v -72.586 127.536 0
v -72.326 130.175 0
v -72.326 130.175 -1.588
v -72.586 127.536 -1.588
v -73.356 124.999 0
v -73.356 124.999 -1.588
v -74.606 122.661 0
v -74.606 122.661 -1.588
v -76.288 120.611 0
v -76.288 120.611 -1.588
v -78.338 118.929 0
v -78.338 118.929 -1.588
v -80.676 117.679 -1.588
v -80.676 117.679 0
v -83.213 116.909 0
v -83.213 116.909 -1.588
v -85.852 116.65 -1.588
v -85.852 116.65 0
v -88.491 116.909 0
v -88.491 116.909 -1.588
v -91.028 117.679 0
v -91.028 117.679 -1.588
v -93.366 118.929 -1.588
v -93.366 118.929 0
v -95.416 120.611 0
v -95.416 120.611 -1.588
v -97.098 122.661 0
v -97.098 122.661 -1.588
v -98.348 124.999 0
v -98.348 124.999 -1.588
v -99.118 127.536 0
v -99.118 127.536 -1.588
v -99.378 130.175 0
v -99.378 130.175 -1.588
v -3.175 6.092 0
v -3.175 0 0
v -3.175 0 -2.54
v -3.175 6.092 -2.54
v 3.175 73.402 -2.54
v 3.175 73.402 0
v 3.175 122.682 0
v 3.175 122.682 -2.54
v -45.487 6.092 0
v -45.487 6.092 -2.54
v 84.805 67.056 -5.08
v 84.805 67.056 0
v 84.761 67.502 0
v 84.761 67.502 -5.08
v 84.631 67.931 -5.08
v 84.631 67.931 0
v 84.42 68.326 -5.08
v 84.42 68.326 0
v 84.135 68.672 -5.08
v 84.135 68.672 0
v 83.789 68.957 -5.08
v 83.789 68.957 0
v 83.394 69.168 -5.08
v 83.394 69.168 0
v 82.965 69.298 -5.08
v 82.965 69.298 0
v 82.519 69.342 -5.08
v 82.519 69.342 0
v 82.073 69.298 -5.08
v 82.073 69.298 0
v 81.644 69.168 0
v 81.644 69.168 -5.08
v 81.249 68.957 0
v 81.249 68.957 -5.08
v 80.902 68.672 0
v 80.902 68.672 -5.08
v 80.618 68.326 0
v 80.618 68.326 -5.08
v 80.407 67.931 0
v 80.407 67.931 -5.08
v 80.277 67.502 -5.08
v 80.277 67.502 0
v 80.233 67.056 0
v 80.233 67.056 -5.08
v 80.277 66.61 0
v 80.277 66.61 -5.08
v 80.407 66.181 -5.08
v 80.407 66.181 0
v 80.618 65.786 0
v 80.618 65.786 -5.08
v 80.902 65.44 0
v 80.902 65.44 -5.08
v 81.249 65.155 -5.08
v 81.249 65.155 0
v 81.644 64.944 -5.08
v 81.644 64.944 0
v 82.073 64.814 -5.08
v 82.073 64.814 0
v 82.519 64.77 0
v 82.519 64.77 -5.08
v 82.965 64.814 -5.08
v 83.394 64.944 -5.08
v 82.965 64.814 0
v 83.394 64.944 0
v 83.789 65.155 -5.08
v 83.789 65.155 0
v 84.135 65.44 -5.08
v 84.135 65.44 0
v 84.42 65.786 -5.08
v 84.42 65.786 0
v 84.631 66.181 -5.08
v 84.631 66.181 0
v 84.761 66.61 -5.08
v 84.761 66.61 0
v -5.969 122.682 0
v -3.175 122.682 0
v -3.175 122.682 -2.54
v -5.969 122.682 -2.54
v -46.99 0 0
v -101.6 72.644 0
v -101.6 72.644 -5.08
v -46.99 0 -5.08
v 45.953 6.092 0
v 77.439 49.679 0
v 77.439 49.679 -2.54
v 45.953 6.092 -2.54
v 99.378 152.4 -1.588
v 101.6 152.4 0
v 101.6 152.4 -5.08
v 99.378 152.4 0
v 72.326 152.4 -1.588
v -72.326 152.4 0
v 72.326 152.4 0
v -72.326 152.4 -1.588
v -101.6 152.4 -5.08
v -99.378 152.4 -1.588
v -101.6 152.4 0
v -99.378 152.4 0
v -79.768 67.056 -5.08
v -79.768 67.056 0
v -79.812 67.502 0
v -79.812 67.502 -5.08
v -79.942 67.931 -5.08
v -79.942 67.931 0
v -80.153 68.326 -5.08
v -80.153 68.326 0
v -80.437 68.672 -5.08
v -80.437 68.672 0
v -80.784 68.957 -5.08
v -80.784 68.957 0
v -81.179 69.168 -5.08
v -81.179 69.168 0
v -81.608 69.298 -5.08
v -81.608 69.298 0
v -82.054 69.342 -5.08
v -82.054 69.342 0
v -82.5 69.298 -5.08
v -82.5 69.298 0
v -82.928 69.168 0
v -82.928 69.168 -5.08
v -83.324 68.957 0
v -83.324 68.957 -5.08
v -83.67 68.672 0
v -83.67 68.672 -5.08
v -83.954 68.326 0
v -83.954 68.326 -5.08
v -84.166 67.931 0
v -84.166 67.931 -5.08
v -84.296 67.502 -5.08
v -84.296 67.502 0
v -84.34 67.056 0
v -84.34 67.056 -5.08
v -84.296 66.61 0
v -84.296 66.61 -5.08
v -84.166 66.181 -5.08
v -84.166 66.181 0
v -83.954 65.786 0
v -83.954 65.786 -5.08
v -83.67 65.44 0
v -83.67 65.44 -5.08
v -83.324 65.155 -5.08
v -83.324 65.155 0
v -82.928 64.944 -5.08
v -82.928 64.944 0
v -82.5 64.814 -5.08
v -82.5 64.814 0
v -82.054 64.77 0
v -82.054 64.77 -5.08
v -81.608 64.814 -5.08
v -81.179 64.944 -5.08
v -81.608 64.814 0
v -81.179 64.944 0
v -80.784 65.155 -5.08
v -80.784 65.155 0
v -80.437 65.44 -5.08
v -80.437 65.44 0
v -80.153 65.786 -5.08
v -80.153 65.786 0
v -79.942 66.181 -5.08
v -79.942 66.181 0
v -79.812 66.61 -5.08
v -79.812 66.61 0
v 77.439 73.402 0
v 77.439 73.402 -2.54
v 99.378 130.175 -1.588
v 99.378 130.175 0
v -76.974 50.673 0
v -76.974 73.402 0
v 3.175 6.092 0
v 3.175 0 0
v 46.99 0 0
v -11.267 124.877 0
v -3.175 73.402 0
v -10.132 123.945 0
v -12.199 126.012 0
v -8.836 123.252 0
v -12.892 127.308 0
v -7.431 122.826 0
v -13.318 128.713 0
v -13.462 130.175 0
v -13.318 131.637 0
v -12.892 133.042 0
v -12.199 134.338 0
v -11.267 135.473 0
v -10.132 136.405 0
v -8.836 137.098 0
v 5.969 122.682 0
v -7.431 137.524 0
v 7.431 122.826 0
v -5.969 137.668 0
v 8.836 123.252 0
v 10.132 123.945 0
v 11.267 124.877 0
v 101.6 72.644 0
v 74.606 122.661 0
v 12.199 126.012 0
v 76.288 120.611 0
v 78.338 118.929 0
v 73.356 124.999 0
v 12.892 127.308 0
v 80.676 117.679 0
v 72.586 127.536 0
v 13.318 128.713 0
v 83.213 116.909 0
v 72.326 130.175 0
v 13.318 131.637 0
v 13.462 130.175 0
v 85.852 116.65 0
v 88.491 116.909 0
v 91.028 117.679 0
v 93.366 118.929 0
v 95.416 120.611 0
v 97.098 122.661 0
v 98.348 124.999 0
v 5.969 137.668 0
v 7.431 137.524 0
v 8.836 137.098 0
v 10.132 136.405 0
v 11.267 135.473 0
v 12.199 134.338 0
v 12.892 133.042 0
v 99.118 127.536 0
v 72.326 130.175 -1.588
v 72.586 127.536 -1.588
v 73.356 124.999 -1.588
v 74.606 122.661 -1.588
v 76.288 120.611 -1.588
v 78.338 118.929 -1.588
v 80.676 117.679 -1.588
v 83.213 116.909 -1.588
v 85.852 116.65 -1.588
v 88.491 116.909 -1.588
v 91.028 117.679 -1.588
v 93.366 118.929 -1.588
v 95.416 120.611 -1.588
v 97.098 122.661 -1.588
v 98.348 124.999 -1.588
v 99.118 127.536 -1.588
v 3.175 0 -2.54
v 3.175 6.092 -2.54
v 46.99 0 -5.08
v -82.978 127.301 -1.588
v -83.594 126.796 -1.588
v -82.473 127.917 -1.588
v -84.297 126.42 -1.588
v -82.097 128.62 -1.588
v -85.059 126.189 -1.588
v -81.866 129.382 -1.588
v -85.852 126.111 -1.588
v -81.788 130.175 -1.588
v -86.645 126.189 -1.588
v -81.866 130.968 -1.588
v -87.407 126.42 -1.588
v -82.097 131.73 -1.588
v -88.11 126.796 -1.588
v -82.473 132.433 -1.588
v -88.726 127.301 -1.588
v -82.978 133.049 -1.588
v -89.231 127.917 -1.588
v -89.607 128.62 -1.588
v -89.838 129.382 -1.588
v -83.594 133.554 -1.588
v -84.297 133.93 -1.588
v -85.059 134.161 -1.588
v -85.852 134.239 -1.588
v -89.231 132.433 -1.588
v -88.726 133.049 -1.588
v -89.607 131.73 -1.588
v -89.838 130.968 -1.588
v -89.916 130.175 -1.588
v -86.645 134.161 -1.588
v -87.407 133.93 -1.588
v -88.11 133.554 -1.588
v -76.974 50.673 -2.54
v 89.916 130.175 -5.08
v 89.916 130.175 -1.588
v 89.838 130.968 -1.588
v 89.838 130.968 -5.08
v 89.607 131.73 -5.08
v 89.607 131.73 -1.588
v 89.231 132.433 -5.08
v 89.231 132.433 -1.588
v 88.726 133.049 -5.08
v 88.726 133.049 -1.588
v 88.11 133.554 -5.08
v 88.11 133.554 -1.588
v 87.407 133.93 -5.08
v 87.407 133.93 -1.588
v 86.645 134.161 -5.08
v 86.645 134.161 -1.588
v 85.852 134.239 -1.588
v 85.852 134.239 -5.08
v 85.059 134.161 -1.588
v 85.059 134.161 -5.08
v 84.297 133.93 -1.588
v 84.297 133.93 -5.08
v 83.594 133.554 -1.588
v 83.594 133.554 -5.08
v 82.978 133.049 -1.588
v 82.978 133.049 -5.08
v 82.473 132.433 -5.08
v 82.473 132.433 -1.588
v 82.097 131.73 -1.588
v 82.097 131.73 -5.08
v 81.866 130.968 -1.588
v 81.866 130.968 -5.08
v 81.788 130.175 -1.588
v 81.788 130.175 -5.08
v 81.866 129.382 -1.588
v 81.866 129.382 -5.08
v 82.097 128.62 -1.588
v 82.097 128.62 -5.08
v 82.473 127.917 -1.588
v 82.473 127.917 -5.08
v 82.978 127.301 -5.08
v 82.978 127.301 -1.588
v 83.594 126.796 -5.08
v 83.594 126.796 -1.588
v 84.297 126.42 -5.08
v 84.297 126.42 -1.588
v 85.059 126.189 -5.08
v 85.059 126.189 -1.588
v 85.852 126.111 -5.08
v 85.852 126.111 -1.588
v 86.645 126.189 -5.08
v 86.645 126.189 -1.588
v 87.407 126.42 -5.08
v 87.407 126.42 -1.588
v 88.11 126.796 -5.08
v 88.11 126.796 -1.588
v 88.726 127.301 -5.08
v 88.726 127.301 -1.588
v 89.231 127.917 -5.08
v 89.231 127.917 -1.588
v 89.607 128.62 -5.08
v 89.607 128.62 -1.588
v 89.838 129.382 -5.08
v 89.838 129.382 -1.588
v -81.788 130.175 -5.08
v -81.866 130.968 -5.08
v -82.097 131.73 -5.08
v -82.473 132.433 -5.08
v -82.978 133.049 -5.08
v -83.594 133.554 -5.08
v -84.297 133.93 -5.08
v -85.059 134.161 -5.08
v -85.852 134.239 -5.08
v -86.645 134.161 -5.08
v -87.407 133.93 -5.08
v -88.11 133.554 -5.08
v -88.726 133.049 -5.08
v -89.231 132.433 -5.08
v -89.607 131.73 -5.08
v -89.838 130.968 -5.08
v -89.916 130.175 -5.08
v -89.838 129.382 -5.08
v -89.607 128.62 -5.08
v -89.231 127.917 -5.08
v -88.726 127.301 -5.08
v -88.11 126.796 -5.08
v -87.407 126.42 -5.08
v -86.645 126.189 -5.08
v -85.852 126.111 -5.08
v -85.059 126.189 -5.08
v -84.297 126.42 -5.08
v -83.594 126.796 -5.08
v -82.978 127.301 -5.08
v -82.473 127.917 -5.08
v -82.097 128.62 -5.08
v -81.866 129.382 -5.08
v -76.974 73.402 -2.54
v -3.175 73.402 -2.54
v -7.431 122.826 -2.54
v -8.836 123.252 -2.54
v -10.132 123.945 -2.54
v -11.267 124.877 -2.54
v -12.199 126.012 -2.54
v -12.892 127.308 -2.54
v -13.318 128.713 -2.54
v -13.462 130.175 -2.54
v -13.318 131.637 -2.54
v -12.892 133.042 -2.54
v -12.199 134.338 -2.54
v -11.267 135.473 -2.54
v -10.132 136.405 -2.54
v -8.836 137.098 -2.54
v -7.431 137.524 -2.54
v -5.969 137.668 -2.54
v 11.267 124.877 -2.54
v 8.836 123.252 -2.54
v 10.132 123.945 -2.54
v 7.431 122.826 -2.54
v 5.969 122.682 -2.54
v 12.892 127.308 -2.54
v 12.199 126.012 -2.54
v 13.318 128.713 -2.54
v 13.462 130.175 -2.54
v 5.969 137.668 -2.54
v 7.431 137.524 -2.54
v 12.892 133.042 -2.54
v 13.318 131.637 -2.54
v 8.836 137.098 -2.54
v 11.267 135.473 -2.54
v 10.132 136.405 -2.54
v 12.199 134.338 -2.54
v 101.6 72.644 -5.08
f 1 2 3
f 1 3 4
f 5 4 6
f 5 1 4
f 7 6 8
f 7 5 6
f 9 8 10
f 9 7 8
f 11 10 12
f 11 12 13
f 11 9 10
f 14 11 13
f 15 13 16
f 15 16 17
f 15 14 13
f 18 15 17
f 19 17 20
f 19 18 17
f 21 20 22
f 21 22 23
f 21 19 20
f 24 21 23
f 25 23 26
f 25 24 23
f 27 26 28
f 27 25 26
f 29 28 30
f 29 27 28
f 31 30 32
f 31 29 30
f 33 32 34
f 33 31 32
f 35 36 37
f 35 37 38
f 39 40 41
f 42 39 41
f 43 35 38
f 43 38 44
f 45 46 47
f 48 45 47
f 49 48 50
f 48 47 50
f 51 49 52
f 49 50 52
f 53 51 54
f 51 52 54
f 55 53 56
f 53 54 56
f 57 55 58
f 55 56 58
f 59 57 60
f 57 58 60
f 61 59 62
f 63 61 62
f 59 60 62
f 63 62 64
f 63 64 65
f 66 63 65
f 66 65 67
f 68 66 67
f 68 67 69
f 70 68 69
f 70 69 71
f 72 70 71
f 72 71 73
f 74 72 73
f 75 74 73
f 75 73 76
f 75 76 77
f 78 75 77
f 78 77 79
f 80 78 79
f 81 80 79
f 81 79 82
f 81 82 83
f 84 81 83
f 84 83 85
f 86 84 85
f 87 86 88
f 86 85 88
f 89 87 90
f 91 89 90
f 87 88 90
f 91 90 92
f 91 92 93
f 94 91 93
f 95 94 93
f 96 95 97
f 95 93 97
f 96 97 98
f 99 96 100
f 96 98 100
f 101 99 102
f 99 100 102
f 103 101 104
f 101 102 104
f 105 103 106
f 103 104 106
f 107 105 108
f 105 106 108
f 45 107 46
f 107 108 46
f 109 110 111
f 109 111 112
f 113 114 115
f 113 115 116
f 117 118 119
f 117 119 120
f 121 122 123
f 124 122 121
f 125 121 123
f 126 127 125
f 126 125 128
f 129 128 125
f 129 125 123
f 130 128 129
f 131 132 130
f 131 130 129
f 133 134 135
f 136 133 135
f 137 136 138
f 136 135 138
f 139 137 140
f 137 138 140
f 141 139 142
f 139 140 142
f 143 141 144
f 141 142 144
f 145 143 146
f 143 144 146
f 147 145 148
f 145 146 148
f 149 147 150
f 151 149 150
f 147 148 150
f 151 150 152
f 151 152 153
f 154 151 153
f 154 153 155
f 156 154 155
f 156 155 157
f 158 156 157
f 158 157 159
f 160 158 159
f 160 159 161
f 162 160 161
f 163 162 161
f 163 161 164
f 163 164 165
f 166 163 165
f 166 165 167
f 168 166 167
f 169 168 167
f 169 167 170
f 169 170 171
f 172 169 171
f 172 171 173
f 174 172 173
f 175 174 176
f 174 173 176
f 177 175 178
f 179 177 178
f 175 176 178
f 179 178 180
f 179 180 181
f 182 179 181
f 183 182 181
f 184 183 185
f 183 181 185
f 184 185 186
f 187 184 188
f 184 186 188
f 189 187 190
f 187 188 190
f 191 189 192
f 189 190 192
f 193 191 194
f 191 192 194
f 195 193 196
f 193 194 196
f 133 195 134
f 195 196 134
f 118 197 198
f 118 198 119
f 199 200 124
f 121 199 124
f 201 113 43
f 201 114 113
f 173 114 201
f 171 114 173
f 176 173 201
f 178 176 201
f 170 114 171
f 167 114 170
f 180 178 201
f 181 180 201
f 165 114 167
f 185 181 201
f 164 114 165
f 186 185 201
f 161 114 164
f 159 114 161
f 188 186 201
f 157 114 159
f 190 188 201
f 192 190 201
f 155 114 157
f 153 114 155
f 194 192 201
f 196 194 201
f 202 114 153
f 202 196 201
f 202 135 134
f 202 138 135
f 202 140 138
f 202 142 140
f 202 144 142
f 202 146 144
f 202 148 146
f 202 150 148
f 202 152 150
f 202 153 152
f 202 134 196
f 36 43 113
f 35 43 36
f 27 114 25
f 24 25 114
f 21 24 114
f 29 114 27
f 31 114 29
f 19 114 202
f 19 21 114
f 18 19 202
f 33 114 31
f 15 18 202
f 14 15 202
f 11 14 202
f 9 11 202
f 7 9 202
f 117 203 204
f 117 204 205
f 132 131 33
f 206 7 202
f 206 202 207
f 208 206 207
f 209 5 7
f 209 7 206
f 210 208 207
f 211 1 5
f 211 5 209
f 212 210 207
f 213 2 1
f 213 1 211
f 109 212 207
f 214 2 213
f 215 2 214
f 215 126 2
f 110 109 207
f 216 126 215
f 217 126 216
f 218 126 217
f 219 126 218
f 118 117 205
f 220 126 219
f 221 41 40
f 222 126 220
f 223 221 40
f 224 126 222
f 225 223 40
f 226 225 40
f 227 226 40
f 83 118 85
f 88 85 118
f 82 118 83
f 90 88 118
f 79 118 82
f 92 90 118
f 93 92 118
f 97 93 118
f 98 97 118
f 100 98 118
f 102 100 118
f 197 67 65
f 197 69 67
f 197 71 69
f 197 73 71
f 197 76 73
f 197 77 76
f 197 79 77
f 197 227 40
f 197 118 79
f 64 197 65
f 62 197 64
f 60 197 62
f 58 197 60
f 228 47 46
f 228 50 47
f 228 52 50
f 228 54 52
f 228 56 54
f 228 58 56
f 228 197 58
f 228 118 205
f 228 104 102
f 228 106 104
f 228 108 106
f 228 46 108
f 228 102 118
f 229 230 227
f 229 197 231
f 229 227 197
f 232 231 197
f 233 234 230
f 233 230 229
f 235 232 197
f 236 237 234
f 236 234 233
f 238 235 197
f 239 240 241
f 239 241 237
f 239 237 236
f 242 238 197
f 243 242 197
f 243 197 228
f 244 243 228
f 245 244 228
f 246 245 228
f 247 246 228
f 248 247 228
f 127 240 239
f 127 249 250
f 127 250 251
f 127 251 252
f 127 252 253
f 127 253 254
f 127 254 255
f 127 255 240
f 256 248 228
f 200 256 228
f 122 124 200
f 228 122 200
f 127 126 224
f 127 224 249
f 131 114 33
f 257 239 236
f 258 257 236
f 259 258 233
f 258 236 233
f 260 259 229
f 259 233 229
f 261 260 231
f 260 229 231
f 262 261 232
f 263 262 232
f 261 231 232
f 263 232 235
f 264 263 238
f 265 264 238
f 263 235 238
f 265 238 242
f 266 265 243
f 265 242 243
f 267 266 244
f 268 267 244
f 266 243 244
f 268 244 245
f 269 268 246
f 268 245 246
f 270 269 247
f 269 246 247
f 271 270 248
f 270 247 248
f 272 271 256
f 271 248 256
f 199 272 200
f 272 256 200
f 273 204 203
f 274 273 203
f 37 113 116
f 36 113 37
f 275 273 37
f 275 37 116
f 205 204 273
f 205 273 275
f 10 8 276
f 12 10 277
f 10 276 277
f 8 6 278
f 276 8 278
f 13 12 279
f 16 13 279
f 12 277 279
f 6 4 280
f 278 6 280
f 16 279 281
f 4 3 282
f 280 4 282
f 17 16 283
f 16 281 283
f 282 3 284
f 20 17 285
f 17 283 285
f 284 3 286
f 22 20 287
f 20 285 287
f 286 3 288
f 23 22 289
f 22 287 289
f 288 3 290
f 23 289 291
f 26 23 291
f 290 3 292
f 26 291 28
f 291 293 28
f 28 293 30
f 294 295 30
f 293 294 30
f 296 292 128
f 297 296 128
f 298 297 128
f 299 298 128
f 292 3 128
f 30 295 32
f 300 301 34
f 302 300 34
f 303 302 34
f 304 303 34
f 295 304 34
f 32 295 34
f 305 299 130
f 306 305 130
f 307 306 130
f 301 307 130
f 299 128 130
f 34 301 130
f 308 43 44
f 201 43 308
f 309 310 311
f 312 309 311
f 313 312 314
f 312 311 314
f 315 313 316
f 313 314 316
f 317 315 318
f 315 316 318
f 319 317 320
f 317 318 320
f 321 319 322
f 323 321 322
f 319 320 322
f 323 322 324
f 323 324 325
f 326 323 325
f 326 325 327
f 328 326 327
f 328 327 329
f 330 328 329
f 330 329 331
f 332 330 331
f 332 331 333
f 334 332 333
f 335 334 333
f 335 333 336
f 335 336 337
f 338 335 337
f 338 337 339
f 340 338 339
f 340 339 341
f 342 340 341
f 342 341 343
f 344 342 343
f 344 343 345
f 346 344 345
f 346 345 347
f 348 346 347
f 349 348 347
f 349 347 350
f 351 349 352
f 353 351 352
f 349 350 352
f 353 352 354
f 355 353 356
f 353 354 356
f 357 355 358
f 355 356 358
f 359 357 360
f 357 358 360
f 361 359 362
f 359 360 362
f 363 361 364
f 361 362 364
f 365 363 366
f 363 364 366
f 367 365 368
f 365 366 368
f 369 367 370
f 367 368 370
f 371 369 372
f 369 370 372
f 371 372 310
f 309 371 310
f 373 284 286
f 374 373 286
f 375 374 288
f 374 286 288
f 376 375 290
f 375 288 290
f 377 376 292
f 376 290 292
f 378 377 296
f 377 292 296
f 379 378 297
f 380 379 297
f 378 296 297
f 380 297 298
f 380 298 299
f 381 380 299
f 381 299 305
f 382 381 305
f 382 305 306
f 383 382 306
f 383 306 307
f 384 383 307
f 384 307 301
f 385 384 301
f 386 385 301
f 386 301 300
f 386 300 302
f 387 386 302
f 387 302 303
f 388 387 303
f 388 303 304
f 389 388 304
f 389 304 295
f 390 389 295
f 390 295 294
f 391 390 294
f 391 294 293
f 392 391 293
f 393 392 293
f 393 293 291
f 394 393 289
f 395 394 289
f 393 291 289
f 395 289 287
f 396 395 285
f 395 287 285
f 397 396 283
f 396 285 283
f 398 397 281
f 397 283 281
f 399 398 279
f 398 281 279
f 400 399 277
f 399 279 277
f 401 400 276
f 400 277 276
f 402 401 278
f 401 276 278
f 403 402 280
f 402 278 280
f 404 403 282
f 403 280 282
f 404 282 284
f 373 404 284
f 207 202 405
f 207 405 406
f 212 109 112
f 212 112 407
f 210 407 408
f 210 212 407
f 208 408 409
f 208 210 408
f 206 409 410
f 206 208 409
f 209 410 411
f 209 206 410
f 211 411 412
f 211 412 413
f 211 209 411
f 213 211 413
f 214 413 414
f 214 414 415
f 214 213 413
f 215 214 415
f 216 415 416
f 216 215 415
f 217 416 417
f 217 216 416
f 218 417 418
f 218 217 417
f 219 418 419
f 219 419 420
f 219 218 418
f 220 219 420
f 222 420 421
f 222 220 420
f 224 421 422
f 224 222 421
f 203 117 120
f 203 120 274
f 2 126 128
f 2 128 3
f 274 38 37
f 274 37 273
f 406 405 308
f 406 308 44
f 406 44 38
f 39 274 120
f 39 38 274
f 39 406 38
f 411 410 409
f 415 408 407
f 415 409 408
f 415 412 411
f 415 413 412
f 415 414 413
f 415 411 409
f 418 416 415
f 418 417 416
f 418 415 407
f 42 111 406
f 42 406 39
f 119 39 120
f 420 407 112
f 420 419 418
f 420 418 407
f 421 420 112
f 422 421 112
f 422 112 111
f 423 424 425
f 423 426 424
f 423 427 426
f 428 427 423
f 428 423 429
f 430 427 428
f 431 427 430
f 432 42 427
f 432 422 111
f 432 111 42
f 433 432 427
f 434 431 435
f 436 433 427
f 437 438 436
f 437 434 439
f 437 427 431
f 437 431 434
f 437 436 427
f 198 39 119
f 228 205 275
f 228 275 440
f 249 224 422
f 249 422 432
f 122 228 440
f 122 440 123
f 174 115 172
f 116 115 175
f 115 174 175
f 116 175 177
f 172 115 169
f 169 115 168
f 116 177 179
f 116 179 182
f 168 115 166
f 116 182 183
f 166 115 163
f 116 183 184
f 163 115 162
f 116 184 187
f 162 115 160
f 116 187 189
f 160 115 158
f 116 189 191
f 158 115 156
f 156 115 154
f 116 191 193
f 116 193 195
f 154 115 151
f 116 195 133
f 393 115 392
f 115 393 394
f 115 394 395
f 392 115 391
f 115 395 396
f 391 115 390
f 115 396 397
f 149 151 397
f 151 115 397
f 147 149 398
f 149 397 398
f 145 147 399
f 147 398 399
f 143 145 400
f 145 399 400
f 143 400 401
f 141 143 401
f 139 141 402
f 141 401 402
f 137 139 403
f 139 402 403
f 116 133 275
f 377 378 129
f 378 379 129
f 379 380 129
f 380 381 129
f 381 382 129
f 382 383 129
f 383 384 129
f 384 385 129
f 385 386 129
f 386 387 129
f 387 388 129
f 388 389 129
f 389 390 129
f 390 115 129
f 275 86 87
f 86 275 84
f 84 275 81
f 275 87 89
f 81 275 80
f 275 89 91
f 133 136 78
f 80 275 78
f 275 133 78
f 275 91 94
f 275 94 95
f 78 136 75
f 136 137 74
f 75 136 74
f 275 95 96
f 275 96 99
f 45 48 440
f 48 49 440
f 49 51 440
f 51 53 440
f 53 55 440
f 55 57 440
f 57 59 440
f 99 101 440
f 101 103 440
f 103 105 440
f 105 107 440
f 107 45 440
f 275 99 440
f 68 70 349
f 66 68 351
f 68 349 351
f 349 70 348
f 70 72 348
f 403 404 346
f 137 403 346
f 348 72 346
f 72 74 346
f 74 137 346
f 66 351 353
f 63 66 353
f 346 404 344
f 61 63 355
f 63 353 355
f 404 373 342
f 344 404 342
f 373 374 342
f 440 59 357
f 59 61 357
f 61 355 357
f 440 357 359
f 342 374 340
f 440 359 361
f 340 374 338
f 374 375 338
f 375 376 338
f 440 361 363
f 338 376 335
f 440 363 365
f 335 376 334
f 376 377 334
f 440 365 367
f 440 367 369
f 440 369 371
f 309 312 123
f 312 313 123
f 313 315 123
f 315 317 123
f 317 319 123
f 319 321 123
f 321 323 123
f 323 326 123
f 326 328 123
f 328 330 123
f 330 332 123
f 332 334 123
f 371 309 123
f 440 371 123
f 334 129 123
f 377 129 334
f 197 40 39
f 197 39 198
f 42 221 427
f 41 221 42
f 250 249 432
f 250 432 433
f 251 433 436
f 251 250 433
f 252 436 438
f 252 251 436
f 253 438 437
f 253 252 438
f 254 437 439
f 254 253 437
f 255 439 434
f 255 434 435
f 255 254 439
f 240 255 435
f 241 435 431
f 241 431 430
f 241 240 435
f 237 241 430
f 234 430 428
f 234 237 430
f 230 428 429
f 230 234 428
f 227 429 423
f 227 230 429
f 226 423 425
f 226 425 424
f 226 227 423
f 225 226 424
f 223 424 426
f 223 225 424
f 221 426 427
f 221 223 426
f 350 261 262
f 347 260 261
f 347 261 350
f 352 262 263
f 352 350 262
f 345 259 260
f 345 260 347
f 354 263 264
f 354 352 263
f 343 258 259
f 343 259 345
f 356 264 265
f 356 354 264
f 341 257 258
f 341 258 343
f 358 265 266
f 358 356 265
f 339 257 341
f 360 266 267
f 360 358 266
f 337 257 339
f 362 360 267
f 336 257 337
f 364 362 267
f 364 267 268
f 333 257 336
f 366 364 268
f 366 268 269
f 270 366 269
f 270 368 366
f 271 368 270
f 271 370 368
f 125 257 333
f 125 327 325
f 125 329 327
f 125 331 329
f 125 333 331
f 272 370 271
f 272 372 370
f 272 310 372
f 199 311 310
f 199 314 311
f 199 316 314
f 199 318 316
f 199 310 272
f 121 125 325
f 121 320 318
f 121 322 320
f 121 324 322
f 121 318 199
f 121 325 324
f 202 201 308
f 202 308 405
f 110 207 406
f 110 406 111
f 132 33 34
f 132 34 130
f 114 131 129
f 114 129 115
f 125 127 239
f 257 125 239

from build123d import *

# Parameters (mm, degrees)
BASE_FLANGE1_DEPTH        = 5.08
TAIL_CONNECTION_DEPTH     = 2.54
SKETCH4_R                 = 4.064
TAB_BOLT_HOLES_DEPTH      = 184.232438176
BATTERY_CUTOUT_DEPTH      = 2.54
SKETCH6_W                 = 6.35
SKETCH6_H                 = 49.280438222
TOP_WIRE_CONNECTION_DEPTH = 2.54
SKETCH7_W                 = 6.35
SKETCH7_H                 = 6.091561778
BOTTOM_WIRES_DEPTH        = 2.54
SKETCH8_R                 = 2.286
BOTTOM_BOLTS_DEPTH        = 184.232438176
CUT_EXTRUDE10_DEPTH       = 1.5875


# Sheet-metal steps are written as plain solids
with BuildPart() as part:
    # Sketch1 → Base-Flange1 (new body)
    with BuildSketch(Plane.XY):
        Polygon((0, 0), (46.99, 0), (101.6, 72.644), (101.6, 152.4), (-101.6, 152.4), (-101.6, 72.644), (-46.99, 0), align=None)
    extrude(amount=-BASE_FLANGE1_DEPTH)

    # Sketch2 → Tail Connection (cut)
    with BuildSketch(Plane.XY):
        with BuildLine():
            Line((-5.969, 137.668), (5.969, 137.668))
            ThreePointArc((5.969, 137.668), (13.462, 130.175), (5.969, 122.682))
            Line((5.969, 122.682), (-5.969, 122.682))
            ThreePointArc((-5.969, 122.682), (-13.462, 130.175), (-5.969, 137.668))
        make_face()
    extrude(amount=-TAIL_CONNECTION_DEPTH, mode=Mode.SUBTRACT)

    # Sketch4 → Tab Bolt Holes (cut, through all)
    with BuildSketch(Plane.XY):
        with Locations((-85.852, 130.175)):
            Circle(SKETCH4_R)
        with Locations((85.852, 130.175)):
            Circle(SKETCH4_R)
    extrude(amount=-TAB_BOLT_HOLES_DEPTH, mode=Mode.SUBTRACT)

    # Sketch5 → Battery Cutout (cut)
    with BuildSketch(Plane.XY):
        Polygon((-76.973649394, 50.672541858), (-76.973649394, 73.401561778), (77.43879929, 73.401561778), (77.43879929, 49.679437927), (45.952574948, 6.091561778), (-45.487425052, 6.091561778), align=None)
    extrude(amount=-BATTERY_CUTOUT_DEPTH, mode=Mode.SUBTRACT)

    # Sketch6 → Top Wire Connection (cut)
    with BuildSketch(Plane.XY):
        with Locations((0, 98.041780889)):
            Rectangle(SKETCH6_W, SKETCH6_H)
    extrude(amount=-TOP_WIRE_CONNECTION_DEPTH, mode=Mode.SUBTRACT)

    # Sketch7 → Bottom Wires (cut)
    with BuildSketch(Plane.XY):
        with Locations((0, 3.045780889)):
            Rectangle(SKETCH7_W, SKETCH7_H)
    extrude(amount=-BOTTOM_WIRES_DEPTH, mode=Mode.SUBTRACT)

    # Sketch8 → Bottom Bolts (cut, through all)
    with BuildSketch(Plane.XY):
        with Locations((-82.053649394, 67.056)):
            Circle(SKETCH8_R)
        with Locations((82.51879929, 67.056)):
            Circle(SKETCH8_R)
    extrude(amount=-BOTTOM_BOLTS_DEPTH, mode=Mode.SUBTRACT)

    # Sketch9 → Cut-Extrude10 (cut)
    with BuildSketch(Plane.XY):
        with BuildLine():
            Line((72.3265, 152.4), (72.3265, 130.175))
            ThreePointArc((72.3265, 130.175), (85.852, 116.6495), (99.3775, 130.175))
            Line((99.3775, 130.175), (99.3775, 152.4))
            Line((99.3775, 152.4), (72.3265, 152.4))
        make_face()
    cut_extrude10 = extrude(amount=-CUT_EXTRUDE10_DEPTH, mode=Mode.SUBTRACT)

    # Mirror1: Cut-Extrude10 across plane
    add(cut_extrude10.mirror(Plane(origin=(0, 0, 0), x_dir=(0, 0, 1), z_dir=(1, 0, 0))), mode=Mode.SUBTRACT)


solid = part.part
